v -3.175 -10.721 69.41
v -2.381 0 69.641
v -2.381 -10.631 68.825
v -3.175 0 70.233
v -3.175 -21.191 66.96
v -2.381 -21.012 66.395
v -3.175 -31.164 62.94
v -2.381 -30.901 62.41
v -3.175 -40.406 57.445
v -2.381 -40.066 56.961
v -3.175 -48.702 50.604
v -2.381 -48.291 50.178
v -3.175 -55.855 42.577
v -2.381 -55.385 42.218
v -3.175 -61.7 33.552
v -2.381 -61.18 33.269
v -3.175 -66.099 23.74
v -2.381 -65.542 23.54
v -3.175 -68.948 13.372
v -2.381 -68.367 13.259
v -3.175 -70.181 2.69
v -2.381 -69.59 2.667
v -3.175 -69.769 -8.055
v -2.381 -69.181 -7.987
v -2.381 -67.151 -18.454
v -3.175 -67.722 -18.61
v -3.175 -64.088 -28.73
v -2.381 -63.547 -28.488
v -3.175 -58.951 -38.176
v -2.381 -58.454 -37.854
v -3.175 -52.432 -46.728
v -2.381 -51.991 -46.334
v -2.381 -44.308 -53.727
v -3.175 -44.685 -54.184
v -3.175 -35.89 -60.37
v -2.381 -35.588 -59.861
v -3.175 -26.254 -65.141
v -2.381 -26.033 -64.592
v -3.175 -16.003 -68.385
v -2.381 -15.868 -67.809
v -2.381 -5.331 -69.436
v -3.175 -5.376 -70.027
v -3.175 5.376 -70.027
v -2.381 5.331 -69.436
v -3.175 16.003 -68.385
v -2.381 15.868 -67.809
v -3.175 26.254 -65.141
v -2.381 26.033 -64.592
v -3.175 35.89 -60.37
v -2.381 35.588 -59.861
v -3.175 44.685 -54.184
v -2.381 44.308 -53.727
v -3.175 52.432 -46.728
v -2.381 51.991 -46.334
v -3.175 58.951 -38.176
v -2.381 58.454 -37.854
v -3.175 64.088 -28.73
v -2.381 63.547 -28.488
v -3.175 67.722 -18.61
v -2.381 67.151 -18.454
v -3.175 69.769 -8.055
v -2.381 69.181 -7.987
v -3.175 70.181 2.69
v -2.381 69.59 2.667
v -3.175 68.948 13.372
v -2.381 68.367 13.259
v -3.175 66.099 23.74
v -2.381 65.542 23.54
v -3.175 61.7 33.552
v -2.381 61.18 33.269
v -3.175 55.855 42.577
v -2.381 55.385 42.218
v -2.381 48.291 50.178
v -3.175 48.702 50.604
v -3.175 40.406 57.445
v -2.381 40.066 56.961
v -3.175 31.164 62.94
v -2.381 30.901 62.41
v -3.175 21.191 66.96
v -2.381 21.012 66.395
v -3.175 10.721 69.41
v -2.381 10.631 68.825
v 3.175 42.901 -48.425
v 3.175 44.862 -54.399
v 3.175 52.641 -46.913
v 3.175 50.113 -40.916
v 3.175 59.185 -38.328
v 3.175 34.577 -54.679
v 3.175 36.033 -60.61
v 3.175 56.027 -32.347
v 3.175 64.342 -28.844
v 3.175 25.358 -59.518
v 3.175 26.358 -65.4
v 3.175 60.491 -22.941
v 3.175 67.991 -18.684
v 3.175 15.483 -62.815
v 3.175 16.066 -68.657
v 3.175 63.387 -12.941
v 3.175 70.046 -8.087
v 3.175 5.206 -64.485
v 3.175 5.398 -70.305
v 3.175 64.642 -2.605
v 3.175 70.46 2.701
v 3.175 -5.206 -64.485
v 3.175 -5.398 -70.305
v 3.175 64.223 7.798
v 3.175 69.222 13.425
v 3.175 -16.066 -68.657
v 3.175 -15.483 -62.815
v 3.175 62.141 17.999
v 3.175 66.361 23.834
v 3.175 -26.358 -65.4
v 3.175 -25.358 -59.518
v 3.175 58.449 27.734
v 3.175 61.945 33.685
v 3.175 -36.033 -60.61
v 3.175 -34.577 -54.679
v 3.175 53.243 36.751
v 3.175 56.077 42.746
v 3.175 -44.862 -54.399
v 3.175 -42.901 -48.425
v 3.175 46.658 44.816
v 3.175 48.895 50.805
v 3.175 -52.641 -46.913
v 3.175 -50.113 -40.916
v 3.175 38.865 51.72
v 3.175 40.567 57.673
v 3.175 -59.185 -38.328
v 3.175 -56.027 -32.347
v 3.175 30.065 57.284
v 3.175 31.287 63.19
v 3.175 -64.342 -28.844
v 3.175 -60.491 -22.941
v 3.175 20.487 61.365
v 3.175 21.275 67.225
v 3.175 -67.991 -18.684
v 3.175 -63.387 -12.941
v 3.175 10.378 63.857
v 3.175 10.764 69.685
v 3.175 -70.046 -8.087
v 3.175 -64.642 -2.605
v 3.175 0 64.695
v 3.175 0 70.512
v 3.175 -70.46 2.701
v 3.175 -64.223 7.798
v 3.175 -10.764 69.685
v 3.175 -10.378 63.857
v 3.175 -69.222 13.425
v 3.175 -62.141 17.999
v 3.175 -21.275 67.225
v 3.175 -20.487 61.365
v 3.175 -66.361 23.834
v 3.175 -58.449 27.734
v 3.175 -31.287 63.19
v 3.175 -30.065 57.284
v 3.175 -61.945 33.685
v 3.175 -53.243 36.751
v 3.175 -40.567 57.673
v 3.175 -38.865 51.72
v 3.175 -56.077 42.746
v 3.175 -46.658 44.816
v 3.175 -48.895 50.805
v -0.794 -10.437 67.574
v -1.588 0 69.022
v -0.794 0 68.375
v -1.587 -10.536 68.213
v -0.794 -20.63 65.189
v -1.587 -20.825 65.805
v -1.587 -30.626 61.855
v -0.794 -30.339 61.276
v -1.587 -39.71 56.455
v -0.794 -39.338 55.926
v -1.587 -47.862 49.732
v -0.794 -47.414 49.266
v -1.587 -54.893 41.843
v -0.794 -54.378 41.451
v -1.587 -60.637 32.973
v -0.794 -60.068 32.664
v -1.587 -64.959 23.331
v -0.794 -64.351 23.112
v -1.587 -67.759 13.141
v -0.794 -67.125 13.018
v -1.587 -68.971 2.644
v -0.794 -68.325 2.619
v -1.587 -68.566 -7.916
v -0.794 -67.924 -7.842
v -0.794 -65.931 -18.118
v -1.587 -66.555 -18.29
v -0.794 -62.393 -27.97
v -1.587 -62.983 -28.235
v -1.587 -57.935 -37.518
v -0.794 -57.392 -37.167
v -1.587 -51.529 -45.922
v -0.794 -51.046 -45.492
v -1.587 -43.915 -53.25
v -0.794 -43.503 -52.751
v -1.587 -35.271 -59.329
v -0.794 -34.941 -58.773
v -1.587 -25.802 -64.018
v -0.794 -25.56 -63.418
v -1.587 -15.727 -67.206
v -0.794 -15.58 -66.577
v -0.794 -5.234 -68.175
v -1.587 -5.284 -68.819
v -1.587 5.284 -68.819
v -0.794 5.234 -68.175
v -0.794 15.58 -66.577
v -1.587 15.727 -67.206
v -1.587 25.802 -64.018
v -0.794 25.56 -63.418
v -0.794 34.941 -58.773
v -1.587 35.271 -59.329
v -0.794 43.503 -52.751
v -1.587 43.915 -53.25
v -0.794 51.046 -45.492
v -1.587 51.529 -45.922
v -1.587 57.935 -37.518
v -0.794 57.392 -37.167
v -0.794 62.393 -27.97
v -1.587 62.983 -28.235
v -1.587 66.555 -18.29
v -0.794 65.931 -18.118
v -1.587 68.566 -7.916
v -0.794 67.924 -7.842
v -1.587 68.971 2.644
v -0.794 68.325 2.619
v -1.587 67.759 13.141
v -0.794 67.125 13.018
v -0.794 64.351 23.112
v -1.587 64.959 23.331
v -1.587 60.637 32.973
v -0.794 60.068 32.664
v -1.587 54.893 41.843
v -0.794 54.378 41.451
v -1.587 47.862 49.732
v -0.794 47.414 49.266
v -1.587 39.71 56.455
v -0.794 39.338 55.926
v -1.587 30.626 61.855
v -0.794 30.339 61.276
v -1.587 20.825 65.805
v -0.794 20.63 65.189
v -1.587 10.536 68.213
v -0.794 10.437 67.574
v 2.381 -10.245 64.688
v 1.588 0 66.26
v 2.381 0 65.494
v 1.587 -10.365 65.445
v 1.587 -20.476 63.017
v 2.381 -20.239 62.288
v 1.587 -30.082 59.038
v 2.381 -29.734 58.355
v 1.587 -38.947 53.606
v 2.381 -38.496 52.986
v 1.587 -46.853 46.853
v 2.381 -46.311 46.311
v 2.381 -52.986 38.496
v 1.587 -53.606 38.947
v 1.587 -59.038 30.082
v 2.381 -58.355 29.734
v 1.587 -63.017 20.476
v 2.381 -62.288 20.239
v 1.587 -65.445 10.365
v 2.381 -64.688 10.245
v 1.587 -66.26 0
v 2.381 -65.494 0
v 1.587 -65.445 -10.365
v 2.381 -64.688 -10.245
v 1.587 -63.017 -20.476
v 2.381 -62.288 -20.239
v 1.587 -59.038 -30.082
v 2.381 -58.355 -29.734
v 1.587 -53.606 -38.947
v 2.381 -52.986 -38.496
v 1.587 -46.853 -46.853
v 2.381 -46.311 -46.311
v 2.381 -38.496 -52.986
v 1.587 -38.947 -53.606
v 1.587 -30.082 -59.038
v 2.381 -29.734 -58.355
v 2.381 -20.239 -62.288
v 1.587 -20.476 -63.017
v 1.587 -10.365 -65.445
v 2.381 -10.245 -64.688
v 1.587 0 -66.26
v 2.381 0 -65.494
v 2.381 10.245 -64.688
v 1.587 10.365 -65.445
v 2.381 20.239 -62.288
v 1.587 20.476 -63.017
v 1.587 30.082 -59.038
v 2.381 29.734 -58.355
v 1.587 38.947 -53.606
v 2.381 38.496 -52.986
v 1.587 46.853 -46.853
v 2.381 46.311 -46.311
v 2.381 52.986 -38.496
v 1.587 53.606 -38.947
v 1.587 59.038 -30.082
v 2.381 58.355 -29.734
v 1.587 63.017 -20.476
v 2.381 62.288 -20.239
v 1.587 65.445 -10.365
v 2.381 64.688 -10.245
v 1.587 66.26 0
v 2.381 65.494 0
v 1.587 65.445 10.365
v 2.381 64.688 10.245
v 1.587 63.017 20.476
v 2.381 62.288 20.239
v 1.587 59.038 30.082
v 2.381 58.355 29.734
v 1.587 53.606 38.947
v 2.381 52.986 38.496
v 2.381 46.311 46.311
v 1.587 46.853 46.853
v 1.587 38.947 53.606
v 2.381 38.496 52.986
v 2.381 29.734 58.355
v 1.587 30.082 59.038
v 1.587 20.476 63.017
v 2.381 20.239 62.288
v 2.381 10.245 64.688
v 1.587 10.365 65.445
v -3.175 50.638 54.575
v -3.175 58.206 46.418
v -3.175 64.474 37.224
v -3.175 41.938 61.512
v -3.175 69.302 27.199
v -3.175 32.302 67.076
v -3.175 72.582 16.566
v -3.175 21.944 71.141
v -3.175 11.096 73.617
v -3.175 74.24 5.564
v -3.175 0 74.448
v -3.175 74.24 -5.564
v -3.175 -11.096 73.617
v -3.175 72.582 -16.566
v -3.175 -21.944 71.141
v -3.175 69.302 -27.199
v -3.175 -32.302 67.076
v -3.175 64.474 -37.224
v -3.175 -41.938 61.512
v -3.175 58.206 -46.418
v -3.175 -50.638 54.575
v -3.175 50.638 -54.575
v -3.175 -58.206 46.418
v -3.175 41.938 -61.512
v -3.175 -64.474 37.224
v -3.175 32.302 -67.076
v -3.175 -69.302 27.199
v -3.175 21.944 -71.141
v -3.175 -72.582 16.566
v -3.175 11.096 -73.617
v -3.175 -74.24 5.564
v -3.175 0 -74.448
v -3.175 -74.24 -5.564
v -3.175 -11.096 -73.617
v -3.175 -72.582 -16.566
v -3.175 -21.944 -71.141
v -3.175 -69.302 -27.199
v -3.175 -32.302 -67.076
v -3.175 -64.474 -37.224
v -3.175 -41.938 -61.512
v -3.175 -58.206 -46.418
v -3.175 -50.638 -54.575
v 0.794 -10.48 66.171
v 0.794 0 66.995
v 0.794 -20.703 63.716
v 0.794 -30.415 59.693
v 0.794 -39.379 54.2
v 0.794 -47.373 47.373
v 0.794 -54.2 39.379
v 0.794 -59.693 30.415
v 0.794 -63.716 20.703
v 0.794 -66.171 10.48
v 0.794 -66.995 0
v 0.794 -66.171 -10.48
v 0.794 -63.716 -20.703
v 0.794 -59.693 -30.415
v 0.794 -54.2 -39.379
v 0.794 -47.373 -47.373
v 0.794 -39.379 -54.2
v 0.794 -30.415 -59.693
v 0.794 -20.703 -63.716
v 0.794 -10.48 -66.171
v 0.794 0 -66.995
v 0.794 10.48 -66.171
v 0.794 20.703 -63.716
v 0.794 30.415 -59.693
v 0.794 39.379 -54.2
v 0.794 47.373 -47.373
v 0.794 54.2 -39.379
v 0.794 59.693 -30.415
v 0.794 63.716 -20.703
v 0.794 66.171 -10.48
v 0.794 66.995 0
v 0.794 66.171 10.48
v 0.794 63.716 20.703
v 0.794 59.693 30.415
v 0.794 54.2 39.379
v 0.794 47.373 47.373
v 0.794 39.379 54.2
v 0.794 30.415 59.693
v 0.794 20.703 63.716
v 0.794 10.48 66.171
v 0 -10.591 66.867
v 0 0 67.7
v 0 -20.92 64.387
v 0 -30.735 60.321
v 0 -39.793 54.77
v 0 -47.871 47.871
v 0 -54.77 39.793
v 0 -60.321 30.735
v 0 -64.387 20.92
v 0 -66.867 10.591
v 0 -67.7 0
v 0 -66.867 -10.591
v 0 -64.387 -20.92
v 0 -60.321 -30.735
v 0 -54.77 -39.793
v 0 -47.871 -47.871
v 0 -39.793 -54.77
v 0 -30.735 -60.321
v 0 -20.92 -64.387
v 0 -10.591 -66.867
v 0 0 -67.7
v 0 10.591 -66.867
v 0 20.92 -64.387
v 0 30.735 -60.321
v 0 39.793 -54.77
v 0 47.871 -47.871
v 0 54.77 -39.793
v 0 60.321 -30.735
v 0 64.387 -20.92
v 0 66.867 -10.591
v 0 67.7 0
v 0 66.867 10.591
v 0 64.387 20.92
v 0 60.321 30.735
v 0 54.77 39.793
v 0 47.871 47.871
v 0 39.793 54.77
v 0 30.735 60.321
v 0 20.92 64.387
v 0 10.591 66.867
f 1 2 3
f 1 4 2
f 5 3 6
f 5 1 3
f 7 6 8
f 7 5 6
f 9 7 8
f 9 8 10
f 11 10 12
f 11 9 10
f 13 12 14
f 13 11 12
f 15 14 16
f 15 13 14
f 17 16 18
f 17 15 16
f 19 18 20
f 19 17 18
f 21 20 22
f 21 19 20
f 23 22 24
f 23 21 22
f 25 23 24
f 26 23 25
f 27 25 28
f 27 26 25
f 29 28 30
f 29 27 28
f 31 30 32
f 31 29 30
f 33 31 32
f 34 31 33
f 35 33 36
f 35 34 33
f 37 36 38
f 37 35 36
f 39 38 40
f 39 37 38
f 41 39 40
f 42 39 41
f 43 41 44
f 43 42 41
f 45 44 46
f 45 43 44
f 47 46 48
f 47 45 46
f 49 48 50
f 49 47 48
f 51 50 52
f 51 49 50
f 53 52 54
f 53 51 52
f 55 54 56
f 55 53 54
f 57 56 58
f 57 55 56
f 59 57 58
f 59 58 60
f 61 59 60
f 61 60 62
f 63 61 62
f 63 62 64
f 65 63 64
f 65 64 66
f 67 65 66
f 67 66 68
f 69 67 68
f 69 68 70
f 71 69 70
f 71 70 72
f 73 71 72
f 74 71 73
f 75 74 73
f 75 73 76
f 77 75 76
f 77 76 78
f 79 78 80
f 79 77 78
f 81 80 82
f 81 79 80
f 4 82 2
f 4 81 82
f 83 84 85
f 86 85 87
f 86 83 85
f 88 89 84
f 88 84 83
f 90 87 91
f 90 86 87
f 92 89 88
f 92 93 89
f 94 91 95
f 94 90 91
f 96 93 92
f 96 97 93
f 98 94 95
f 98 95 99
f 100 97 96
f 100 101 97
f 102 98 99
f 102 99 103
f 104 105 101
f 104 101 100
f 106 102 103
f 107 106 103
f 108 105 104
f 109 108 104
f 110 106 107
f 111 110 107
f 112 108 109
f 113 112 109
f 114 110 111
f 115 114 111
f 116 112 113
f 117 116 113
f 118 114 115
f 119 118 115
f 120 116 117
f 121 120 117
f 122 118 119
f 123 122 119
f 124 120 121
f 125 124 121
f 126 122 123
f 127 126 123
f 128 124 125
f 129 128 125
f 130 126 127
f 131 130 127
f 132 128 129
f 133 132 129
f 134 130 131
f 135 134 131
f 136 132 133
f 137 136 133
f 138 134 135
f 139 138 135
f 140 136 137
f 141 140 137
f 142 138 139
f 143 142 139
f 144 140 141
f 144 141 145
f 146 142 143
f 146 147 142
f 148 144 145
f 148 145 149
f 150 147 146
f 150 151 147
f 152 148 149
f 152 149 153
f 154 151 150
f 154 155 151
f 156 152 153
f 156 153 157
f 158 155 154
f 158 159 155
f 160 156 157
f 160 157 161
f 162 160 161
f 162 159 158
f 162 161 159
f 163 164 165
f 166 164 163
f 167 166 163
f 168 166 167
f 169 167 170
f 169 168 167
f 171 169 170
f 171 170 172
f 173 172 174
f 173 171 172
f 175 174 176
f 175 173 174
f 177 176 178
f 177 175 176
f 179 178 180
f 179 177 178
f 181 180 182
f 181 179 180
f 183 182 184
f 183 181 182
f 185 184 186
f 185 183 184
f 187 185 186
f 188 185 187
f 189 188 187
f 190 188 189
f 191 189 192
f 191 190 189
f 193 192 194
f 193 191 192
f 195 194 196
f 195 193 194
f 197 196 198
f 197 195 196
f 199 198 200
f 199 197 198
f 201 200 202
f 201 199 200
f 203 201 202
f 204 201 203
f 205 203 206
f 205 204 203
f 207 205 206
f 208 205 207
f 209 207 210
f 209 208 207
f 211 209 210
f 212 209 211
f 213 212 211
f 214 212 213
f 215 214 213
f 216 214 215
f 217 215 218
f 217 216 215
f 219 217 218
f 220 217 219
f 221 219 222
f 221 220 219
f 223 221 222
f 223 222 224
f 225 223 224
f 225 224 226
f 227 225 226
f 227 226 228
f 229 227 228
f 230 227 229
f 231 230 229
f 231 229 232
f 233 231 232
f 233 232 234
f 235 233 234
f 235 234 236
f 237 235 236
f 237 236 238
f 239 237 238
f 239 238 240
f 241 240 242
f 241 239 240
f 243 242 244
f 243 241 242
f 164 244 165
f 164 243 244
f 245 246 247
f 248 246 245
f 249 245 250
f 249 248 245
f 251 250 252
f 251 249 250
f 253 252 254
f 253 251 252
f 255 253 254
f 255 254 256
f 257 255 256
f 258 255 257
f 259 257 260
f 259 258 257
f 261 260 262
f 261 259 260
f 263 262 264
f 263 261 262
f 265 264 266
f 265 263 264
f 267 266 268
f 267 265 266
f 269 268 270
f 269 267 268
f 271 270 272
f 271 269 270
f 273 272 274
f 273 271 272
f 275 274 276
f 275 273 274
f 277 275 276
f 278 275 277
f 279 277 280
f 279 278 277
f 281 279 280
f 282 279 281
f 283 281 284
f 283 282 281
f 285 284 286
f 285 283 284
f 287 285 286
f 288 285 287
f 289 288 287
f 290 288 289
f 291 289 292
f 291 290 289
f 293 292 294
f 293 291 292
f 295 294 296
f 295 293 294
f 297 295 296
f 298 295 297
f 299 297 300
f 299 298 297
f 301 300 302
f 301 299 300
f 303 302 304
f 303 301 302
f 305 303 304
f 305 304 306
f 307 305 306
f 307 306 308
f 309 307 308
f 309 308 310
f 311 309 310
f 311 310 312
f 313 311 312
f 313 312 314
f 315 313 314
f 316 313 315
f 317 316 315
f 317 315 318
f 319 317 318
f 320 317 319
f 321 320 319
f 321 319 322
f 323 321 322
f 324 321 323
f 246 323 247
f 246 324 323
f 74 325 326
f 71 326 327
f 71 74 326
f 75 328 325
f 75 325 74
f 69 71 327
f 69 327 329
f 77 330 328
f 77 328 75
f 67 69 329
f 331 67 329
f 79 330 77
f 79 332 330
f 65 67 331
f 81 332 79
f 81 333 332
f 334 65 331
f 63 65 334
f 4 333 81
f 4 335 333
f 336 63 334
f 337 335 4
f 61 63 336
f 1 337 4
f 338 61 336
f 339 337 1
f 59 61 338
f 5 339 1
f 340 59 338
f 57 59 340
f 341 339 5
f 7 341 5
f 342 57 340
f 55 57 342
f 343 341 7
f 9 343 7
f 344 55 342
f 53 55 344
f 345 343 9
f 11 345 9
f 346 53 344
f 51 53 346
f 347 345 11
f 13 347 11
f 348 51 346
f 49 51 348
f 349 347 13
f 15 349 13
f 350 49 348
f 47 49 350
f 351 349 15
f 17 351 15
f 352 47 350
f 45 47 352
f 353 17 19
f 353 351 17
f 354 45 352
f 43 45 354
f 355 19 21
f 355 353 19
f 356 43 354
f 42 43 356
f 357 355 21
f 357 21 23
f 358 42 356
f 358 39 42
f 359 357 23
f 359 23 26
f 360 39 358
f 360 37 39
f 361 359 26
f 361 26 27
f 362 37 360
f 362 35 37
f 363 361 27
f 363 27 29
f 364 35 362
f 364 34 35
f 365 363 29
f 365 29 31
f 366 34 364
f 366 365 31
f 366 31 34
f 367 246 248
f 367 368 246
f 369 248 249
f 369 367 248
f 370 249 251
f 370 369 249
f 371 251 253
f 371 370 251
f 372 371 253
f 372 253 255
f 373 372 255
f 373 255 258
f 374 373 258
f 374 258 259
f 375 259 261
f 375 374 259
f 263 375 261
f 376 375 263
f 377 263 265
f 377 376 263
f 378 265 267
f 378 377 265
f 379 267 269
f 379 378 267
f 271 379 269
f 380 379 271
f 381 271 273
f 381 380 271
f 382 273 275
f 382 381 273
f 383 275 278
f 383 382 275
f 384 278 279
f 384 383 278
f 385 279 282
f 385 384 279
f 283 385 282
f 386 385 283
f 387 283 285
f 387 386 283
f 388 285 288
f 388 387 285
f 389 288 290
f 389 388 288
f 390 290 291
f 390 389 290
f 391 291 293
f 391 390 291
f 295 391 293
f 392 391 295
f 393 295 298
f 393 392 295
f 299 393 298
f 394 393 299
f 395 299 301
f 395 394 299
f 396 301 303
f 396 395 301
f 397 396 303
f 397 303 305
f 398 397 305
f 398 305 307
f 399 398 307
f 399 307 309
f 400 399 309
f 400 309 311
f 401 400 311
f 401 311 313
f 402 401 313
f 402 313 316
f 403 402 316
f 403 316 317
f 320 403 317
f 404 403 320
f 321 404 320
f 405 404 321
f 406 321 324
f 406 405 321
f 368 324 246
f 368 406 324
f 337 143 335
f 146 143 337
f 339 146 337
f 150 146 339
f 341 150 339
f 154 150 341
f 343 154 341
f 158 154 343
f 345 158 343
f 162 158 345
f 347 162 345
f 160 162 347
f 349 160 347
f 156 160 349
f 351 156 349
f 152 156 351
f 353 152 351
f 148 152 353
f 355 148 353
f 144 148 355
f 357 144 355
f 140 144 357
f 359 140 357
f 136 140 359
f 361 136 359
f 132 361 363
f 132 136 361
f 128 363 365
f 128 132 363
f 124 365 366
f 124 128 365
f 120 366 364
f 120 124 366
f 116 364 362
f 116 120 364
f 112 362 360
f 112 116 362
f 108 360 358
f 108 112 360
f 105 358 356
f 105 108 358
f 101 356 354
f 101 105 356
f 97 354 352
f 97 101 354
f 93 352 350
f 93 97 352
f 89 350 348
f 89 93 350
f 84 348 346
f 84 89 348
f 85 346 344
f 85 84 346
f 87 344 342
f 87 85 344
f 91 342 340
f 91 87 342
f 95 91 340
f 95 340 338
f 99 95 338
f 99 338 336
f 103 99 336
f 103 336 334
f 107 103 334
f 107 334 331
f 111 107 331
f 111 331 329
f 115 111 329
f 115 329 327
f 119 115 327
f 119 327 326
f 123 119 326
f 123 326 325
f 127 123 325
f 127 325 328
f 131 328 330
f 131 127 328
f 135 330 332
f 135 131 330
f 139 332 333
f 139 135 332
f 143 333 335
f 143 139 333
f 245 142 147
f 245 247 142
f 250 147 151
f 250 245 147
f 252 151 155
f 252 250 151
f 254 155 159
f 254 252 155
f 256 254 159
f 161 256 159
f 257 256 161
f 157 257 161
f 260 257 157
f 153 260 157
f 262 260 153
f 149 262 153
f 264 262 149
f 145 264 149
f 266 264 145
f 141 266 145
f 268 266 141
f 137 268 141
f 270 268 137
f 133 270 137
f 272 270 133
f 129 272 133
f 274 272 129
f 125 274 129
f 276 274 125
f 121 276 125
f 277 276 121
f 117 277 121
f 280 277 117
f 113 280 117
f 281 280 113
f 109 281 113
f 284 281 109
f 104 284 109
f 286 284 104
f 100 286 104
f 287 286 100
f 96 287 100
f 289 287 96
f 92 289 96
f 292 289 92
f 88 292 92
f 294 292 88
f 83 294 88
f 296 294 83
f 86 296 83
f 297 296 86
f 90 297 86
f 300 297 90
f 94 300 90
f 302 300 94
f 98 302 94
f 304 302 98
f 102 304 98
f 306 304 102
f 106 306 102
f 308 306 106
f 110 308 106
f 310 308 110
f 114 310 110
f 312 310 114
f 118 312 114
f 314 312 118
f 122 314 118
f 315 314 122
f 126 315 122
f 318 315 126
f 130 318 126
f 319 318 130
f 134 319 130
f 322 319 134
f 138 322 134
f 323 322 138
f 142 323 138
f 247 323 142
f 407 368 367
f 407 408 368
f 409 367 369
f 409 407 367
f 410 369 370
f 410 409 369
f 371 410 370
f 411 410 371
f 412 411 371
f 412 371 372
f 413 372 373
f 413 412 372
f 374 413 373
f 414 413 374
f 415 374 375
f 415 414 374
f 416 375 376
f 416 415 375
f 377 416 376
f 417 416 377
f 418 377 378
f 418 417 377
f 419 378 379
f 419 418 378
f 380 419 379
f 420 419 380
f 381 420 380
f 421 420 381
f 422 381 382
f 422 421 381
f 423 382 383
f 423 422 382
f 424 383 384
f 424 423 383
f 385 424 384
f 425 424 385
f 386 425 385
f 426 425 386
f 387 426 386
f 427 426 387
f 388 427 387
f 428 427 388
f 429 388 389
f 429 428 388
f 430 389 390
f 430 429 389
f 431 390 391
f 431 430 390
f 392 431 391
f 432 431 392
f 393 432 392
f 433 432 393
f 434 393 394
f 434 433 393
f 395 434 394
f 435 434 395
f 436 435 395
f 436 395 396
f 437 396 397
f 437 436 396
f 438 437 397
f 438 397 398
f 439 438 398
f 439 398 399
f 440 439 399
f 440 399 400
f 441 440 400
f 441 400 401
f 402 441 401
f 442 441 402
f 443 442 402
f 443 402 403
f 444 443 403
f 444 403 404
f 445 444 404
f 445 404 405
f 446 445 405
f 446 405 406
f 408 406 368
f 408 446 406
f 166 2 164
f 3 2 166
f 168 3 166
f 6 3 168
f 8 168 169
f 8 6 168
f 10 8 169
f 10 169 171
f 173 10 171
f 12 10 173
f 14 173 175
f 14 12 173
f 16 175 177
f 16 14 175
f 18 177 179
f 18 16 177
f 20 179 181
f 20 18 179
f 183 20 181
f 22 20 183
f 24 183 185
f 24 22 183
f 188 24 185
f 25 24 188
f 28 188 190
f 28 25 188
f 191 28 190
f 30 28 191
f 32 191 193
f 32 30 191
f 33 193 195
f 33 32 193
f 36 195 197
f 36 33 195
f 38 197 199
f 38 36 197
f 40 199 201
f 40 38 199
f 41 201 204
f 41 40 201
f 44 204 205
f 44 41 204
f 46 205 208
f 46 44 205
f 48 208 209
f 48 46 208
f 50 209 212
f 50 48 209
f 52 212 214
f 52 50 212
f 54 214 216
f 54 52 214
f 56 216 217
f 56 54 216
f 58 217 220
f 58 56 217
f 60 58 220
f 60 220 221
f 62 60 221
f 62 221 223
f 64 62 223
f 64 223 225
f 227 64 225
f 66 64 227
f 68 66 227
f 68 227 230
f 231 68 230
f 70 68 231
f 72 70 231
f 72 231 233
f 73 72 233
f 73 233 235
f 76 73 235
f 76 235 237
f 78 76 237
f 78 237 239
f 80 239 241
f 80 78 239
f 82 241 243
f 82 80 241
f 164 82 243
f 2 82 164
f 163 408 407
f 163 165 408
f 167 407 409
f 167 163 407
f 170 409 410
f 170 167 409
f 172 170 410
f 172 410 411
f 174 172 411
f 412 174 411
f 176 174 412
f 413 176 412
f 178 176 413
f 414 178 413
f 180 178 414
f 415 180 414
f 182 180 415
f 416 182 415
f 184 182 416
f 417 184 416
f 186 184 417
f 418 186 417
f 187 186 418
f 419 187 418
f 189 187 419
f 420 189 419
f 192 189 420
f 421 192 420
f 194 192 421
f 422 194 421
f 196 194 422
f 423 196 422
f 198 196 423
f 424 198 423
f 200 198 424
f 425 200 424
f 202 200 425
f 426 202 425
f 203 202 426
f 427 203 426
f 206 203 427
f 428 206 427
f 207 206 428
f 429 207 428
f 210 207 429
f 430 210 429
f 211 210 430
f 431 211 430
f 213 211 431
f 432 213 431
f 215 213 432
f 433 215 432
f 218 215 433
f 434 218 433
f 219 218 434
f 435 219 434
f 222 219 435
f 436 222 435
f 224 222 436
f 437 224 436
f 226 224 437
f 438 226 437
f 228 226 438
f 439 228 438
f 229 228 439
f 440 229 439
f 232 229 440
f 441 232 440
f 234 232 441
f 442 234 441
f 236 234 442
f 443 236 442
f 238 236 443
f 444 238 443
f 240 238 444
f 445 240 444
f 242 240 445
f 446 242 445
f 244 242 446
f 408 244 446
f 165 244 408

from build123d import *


with BuildPart() as part:
    # Bottle_Liner_Top Sketch → Bottle_Liner_Top (revolve)
    with BuildSketch(Plane.XY):
        Polygon((3.175, 64.694892683), (2.38125, 65.493853894), (1.5875, 66.260295916), (0.79375, 66.99533651), (0, 67.7), (-0.79375, 68.375226954), (-1.5875, 69.021882544), (-2.38125, 69.640763827), (-3.175, 70.232606084), (-3.175, 74.4485), (3.175, 70.5115), align=None)
    revolve(axis=Axis((-300, 0, 0), (1, 0, 0)))


solid = part.part
